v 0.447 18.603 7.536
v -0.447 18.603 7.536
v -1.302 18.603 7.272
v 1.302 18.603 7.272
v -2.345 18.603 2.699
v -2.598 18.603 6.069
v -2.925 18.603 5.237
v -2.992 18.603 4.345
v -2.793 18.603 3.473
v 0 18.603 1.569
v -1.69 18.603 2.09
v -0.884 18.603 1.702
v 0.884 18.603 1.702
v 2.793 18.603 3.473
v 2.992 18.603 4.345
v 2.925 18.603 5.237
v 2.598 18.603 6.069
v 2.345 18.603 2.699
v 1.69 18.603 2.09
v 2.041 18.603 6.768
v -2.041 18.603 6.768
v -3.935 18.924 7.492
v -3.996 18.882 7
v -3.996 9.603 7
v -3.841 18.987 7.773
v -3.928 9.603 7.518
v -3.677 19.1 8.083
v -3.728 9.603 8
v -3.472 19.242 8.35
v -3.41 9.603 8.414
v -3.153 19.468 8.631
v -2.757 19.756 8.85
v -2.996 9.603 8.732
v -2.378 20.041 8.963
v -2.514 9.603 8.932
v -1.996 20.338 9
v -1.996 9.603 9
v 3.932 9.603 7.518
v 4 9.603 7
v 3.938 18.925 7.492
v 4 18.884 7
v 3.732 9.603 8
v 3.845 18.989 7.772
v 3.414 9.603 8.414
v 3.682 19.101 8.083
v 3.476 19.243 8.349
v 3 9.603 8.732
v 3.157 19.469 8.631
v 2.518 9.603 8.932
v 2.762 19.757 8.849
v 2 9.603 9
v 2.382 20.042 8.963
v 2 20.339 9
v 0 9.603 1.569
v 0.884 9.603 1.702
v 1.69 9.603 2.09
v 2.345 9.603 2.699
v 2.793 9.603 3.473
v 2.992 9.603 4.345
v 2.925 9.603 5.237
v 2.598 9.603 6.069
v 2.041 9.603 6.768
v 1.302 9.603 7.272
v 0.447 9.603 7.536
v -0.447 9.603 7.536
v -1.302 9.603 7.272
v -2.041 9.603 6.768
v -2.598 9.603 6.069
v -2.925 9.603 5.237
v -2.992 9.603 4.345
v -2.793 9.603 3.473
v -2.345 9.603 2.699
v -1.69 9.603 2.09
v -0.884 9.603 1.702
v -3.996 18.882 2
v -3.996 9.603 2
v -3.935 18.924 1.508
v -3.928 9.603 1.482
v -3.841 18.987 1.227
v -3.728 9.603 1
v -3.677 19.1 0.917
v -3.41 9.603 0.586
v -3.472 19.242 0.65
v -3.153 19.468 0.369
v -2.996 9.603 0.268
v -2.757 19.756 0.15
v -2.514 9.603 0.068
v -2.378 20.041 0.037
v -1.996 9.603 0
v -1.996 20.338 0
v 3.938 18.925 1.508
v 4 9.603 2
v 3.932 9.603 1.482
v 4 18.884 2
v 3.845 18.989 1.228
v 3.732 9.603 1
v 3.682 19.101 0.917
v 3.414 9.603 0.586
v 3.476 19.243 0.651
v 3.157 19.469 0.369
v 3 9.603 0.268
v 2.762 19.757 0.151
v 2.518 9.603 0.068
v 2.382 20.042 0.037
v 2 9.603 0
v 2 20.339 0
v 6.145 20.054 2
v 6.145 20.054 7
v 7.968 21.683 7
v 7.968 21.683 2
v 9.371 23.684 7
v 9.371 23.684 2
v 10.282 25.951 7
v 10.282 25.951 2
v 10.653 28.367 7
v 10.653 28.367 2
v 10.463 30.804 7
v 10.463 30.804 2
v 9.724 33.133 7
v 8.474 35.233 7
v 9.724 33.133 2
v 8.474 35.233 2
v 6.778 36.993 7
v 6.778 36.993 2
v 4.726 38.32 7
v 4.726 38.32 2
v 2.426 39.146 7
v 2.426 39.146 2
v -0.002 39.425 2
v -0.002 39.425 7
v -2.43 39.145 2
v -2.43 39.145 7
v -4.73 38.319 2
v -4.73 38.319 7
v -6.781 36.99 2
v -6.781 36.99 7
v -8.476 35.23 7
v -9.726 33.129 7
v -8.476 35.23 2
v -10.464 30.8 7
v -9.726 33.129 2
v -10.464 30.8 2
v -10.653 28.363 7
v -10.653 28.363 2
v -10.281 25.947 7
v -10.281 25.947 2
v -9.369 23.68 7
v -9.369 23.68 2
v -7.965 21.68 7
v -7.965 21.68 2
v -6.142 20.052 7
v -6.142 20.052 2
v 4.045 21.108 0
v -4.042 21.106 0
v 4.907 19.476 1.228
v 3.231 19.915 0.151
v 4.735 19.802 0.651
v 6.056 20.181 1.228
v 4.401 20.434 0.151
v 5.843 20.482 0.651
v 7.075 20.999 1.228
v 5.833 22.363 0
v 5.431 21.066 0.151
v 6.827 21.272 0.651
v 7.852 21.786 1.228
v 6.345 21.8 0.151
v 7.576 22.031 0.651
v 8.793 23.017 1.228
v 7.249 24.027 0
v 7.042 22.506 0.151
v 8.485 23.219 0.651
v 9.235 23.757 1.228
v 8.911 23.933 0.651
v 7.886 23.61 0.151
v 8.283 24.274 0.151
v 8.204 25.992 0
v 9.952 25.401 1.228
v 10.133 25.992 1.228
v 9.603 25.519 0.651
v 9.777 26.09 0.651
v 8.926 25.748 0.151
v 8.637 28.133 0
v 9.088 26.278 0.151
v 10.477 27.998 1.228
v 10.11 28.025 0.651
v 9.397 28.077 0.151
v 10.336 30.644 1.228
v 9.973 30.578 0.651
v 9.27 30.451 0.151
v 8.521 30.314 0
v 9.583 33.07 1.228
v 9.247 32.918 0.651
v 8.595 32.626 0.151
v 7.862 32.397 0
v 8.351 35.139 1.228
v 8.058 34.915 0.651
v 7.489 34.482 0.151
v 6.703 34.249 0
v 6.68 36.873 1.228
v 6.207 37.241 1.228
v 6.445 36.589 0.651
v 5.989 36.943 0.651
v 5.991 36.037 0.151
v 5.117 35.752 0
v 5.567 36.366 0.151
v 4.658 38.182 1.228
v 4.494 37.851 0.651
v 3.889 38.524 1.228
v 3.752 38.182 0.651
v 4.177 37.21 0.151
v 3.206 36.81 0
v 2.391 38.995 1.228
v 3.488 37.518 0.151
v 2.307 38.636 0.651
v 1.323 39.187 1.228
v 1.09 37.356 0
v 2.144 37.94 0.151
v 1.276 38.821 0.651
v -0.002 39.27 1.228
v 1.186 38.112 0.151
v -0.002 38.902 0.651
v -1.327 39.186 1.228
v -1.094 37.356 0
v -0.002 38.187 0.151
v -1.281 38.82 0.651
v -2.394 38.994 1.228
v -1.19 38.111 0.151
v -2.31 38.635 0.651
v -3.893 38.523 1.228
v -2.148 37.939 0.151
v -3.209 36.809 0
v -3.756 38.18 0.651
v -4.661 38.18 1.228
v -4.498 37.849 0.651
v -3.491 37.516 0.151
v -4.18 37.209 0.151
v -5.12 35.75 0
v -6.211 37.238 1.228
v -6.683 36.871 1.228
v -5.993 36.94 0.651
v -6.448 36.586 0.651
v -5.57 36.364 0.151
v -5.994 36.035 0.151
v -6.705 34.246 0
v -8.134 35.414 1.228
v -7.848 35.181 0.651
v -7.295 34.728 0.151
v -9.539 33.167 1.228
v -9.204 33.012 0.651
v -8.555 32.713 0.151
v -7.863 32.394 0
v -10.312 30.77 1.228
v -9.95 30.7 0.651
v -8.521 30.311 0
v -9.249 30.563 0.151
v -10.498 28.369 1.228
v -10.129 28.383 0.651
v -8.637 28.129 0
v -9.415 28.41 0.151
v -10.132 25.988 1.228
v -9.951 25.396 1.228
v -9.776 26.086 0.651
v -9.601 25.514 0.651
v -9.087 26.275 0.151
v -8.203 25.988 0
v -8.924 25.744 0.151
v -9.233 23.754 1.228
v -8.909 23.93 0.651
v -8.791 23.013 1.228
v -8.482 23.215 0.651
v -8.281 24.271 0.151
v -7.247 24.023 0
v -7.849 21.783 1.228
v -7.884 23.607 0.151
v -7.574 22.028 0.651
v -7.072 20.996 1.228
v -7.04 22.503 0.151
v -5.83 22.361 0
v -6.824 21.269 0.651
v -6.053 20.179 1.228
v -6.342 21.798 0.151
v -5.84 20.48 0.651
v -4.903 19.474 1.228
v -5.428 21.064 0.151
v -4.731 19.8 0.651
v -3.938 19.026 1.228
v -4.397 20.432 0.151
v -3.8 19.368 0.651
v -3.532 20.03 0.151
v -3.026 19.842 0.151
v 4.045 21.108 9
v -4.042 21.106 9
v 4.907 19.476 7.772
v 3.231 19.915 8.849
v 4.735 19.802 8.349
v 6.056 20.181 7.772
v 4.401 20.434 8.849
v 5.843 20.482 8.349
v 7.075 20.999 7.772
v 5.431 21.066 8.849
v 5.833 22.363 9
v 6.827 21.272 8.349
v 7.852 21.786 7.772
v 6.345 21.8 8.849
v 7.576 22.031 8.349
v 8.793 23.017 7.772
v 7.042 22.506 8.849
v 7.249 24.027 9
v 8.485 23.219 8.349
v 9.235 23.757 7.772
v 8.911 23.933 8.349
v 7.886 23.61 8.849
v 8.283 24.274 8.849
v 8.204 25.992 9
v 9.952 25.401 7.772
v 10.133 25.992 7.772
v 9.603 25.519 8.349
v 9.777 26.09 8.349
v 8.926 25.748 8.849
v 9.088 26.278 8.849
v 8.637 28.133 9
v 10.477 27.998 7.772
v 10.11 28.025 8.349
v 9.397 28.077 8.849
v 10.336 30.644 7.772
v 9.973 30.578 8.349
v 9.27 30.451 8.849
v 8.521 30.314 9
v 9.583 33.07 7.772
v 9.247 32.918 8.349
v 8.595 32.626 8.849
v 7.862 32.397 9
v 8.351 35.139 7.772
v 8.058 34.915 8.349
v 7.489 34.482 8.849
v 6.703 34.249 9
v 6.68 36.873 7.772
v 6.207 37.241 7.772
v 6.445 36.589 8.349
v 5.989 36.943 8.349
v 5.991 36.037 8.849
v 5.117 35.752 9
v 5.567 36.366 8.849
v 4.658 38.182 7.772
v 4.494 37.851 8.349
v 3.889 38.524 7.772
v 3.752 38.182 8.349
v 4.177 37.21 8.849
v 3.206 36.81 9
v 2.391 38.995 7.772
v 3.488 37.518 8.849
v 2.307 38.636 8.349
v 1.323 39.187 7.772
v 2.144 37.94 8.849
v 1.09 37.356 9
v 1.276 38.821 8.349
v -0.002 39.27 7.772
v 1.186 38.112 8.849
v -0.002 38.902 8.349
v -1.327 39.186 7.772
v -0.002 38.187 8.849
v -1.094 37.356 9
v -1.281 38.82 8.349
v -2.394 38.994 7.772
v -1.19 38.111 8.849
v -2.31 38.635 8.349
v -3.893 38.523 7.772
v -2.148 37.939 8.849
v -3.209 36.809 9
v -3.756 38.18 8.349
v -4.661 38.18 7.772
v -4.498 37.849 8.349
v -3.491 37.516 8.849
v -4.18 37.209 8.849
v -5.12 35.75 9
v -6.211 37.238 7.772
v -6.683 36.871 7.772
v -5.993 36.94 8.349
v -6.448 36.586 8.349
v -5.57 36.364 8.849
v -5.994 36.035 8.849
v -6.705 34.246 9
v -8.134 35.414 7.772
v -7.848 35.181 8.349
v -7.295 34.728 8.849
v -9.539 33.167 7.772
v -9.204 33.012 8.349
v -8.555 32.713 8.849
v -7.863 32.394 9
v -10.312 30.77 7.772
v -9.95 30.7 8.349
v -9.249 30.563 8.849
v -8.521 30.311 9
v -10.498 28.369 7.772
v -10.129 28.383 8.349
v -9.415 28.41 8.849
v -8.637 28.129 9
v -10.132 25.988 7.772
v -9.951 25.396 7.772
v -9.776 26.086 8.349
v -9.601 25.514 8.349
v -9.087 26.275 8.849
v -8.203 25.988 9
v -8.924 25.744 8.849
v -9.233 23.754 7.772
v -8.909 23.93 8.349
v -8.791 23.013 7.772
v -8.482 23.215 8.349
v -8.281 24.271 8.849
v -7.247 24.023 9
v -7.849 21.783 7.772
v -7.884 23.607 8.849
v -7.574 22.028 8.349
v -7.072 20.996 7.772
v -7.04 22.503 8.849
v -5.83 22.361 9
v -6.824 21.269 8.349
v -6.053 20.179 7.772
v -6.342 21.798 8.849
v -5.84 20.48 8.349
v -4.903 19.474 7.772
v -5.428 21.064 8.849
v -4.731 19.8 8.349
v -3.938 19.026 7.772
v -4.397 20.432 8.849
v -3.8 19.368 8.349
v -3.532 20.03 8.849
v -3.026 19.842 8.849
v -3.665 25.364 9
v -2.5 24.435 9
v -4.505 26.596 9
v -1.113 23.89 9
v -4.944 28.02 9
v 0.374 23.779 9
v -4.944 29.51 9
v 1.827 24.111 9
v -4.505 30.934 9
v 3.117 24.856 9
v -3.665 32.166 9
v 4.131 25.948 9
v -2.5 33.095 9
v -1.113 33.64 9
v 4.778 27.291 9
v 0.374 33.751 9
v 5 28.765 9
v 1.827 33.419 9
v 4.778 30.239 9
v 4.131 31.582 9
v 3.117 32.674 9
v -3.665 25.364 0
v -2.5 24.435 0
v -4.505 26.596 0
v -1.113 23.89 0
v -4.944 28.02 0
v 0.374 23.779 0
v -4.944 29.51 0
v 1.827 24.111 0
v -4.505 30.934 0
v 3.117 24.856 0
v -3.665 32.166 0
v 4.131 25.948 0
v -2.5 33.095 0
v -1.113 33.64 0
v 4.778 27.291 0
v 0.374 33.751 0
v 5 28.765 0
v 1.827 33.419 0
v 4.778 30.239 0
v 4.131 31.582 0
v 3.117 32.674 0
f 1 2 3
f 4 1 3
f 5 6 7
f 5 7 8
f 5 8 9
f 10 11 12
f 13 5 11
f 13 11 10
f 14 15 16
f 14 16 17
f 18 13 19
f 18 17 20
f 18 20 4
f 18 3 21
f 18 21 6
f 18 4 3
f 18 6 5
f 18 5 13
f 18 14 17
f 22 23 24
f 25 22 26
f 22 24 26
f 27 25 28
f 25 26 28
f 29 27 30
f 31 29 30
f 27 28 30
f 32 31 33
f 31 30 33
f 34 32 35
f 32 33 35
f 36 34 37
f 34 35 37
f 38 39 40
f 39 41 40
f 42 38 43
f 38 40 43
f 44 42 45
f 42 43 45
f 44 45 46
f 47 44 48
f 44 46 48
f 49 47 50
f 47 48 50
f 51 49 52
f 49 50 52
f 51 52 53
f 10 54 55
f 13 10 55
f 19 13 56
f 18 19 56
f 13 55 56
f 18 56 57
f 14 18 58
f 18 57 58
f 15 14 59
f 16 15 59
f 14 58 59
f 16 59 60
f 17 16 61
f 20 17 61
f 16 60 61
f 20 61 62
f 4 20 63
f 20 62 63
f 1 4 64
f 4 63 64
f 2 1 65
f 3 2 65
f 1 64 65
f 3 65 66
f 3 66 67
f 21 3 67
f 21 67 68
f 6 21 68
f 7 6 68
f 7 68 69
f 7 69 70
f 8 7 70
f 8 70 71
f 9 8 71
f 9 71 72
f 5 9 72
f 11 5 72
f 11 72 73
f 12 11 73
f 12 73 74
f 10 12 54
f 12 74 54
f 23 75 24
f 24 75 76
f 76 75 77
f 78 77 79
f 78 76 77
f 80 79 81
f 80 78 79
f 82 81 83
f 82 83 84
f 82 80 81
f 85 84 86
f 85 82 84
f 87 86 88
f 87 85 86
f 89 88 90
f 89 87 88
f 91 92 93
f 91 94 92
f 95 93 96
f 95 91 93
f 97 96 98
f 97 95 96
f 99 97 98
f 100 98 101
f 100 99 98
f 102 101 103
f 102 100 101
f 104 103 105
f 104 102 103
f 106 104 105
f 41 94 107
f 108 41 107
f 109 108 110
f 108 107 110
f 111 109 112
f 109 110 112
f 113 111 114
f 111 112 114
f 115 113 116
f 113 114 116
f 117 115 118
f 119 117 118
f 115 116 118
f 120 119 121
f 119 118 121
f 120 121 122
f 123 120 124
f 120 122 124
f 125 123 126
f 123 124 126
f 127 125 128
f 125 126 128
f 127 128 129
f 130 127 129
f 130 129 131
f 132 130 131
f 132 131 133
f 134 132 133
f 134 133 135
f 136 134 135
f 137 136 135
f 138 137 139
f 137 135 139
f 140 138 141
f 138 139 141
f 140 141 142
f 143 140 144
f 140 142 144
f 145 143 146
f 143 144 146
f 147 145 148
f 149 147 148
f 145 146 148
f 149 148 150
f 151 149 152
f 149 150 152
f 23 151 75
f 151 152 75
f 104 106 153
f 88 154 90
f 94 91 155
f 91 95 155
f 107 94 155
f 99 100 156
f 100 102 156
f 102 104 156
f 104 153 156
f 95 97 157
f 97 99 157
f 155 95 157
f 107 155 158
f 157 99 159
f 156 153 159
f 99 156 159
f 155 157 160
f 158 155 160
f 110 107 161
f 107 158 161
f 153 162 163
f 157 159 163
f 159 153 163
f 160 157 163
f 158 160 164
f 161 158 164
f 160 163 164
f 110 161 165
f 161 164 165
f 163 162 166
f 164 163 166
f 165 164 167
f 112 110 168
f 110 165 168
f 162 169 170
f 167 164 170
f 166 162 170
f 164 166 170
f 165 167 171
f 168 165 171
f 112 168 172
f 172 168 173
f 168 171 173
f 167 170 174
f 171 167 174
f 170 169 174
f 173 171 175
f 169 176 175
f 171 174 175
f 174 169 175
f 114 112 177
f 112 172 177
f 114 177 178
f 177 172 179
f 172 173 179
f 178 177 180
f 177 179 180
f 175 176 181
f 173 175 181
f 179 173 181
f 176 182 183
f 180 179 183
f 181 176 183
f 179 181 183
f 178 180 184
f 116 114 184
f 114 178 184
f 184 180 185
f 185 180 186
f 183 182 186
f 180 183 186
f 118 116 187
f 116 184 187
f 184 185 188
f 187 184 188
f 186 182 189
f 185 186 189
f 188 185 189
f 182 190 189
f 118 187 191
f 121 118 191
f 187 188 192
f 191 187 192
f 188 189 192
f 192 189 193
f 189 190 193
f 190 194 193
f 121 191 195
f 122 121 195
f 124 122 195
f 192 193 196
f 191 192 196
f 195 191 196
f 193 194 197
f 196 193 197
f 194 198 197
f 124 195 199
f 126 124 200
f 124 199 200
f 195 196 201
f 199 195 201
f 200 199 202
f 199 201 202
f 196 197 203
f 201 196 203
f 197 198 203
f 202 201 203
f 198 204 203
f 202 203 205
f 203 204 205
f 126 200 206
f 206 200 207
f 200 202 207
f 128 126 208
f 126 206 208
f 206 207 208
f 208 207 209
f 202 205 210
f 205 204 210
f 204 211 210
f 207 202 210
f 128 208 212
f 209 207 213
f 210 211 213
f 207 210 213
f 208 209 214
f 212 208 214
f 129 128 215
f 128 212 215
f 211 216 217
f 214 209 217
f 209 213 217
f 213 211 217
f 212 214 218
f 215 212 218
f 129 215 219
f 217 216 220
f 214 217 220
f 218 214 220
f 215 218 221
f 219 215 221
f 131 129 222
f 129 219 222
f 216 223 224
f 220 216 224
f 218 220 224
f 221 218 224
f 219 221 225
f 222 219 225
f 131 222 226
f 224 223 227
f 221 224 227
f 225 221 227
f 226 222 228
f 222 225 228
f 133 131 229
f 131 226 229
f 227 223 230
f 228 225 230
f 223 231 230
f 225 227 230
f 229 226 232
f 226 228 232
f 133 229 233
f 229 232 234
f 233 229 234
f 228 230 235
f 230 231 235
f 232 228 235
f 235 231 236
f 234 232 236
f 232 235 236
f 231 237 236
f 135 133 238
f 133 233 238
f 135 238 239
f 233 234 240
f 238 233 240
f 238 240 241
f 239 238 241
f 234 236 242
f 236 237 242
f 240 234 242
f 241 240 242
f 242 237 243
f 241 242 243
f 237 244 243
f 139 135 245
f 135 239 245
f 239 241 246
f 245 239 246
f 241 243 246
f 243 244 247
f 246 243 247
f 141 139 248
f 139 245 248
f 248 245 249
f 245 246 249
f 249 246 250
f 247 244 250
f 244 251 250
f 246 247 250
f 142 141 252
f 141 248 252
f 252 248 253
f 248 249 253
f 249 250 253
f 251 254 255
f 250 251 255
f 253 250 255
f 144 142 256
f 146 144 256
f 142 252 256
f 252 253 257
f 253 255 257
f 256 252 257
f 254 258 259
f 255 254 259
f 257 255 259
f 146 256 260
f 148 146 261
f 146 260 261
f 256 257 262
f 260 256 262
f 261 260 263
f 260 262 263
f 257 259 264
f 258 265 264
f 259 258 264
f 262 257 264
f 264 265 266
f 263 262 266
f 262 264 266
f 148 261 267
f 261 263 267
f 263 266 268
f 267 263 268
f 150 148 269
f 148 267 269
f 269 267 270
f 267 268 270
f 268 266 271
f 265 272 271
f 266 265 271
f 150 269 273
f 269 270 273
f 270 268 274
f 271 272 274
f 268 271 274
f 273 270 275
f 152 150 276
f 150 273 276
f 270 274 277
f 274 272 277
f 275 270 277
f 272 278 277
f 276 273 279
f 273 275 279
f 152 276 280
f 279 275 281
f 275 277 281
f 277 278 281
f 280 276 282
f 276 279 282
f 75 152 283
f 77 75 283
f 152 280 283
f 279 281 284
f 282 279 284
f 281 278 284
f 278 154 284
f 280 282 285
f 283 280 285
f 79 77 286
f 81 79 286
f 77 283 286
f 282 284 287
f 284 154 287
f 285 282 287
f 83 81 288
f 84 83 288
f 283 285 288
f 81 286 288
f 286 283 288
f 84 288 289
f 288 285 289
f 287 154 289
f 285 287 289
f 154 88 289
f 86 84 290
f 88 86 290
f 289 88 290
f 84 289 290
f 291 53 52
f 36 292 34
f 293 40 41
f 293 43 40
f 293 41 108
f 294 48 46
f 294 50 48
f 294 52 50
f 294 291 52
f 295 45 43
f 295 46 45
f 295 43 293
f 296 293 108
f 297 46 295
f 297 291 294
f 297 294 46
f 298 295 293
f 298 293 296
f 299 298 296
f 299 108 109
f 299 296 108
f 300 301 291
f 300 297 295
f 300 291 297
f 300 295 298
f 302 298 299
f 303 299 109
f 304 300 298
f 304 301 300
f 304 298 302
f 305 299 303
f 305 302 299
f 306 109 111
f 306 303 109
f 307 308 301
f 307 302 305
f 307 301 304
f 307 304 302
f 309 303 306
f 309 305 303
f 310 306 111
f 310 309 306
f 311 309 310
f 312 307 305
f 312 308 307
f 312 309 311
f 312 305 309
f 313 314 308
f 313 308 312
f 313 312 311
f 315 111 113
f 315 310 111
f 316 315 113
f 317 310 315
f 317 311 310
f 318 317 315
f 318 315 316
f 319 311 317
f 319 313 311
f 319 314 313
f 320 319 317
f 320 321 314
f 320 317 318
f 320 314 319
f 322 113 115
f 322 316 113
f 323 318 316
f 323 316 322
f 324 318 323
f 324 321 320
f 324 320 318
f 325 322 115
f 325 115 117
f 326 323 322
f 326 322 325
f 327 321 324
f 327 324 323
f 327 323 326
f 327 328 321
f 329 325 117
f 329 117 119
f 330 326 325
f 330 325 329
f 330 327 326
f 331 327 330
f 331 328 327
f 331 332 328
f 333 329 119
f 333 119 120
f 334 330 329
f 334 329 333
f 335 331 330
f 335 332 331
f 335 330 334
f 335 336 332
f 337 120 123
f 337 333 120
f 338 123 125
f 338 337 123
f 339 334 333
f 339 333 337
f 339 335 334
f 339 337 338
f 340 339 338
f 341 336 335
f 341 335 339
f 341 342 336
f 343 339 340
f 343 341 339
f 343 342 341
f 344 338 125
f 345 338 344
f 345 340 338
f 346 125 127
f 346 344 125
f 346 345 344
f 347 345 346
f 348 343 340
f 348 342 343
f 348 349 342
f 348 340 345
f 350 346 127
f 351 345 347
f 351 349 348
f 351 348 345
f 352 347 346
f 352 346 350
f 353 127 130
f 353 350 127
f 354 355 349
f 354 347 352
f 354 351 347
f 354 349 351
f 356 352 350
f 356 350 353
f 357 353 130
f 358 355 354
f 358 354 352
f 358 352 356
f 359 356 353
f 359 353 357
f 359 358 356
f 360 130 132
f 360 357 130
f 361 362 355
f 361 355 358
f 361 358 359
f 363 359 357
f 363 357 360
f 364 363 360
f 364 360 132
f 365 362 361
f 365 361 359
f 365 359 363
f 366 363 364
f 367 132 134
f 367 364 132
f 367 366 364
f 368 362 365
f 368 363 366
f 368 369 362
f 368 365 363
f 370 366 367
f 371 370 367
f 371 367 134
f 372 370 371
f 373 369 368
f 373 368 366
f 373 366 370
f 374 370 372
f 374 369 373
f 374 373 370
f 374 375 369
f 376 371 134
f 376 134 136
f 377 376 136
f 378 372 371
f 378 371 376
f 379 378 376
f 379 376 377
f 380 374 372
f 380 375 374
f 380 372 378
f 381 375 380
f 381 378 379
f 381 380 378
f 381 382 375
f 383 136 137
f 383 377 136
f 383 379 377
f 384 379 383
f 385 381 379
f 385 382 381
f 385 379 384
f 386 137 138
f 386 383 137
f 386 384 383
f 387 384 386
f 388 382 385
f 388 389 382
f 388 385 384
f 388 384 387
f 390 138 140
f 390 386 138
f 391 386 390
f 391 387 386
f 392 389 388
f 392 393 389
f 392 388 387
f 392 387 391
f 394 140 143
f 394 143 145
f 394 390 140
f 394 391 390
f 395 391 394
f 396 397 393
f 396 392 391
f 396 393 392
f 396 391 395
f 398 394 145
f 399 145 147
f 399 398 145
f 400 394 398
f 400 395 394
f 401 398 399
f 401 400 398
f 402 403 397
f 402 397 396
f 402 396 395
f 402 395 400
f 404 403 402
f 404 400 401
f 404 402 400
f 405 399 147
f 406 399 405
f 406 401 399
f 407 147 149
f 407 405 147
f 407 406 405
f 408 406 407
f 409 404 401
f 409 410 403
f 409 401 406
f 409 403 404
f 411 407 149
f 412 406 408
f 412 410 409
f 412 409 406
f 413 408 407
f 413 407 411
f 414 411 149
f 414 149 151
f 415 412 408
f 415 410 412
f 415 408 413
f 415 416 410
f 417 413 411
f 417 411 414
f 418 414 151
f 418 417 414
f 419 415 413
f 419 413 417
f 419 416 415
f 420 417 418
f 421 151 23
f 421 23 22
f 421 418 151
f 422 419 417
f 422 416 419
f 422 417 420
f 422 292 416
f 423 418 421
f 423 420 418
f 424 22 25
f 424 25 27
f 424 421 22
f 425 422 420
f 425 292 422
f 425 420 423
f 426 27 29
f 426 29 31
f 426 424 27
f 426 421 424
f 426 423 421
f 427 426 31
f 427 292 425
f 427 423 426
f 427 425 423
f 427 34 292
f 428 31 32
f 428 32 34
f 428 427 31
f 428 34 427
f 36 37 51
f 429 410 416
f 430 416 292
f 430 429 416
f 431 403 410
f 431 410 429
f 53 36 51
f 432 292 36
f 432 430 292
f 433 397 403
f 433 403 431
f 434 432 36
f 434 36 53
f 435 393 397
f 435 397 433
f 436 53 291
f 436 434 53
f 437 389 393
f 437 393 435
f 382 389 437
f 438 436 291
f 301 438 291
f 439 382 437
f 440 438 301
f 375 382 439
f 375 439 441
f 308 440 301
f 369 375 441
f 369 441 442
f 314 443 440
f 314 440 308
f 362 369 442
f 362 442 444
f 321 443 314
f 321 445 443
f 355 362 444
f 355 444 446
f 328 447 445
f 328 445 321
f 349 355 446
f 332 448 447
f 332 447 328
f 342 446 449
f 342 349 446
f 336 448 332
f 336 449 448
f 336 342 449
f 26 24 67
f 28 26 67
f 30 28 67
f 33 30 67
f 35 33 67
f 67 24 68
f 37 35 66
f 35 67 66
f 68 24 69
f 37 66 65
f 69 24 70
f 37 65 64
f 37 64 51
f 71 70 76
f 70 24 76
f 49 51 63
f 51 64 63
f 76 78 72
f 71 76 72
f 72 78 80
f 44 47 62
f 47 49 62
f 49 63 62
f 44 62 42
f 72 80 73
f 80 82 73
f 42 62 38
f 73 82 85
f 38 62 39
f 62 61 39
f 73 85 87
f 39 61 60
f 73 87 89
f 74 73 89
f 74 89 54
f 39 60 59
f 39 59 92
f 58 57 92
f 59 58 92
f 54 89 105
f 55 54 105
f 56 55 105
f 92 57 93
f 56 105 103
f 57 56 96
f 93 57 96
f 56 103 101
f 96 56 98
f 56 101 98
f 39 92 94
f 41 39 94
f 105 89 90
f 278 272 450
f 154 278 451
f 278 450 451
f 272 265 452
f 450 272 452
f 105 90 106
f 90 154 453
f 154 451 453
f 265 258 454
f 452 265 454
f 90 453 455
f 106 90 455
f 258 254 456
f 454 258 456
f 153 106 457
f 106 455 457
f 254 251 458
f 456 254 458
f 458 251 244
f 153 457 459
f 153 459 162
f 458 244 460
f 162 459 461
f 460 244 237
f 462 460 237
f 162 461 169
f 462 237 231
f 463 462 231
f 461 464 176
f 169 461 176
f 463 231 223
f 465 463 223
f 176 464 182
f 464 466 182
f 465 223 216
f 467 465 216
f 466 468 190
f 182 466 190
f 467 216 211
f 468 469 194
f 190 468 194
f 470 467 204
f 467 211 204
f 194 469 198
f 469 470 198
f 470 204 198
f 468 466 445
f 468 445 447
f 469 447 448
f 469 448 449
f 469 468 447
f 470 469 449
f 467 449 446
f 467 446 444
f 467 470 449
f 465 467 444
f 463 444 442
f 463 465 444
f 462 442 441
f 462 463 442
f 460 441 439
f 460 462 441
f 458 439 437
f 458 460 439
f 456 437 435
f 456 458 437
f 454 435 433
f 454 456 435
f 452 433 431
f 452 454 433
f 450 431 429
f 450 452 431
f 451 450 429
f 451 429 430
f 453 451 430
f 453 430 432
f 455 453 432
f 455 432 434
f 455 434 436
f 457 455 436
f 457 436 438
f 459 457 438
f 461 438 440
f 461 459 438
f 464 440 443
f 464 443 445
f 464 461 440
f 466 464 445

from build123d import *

# Parameters (mm, degrees)
SKETCH1_R           = 5
BOSS_EXTRUDE1_DEPTH = 9
FILLET1_R           = 2
SKETCH2_R           = 3
CUT_EXTRUDE2_DEPTH  = 9


with BuildPart() as part:
    # Sketch1 → Boss-Extrude1 (new body)
    with BuildSketch(Plane.XY):
        with BuildLine():
            Line((-3.996251998, 18.882233703), (-3.996251998, 9.603351185))
            Line((-3.996251998, 9.603351185), (0, 9.603351185))
            Line((0, 9.603351185), (4, 9.603351185))
            Line((4, 9.603351185), (4, 18.883750084))
            ThreePointArc((4, 18.883750084), (-0.002021567, 39.425278988), (-3.996251998, 18.882233703))
        make_face()
        with Locations((0, 28.765059691)):
            Circle(SKETCH1_R, mode=Mode.SUBTRACT)
    extrude(amount=BOSS_EXTRUDE1_DEPTH)

    # Fillet1
    fillet1_edges = [part.edges().sort_by_distance(p)[0] for p in [
        (-0.002021567, 39.425278988, 9),
        (-3.996251998, 14.242792444, 9),
        (-3.996251998, 14.242792444, 0),
        (-0.002021567, 39.425278988, 0),
        (4, 14.243550634, 0),
        (4, 14.243550634, 9),
    ]]
    fillet(fillet1_edges, radius=FILLET1_R)

    # Sketch2 → Cut-Extrude2 (cut)
    with BuildSketch(Plane.XZ.offset(-9.603351185)):
        with Locations(Location((0, 4.569140721, 0), (0, 0, 270))):
            Circle(SKETCH2_R)
    extrude(amount=-CUT_EXTRUDE2_DEPTH, mode=Mode.SUBTRACT)


solid = part.part
